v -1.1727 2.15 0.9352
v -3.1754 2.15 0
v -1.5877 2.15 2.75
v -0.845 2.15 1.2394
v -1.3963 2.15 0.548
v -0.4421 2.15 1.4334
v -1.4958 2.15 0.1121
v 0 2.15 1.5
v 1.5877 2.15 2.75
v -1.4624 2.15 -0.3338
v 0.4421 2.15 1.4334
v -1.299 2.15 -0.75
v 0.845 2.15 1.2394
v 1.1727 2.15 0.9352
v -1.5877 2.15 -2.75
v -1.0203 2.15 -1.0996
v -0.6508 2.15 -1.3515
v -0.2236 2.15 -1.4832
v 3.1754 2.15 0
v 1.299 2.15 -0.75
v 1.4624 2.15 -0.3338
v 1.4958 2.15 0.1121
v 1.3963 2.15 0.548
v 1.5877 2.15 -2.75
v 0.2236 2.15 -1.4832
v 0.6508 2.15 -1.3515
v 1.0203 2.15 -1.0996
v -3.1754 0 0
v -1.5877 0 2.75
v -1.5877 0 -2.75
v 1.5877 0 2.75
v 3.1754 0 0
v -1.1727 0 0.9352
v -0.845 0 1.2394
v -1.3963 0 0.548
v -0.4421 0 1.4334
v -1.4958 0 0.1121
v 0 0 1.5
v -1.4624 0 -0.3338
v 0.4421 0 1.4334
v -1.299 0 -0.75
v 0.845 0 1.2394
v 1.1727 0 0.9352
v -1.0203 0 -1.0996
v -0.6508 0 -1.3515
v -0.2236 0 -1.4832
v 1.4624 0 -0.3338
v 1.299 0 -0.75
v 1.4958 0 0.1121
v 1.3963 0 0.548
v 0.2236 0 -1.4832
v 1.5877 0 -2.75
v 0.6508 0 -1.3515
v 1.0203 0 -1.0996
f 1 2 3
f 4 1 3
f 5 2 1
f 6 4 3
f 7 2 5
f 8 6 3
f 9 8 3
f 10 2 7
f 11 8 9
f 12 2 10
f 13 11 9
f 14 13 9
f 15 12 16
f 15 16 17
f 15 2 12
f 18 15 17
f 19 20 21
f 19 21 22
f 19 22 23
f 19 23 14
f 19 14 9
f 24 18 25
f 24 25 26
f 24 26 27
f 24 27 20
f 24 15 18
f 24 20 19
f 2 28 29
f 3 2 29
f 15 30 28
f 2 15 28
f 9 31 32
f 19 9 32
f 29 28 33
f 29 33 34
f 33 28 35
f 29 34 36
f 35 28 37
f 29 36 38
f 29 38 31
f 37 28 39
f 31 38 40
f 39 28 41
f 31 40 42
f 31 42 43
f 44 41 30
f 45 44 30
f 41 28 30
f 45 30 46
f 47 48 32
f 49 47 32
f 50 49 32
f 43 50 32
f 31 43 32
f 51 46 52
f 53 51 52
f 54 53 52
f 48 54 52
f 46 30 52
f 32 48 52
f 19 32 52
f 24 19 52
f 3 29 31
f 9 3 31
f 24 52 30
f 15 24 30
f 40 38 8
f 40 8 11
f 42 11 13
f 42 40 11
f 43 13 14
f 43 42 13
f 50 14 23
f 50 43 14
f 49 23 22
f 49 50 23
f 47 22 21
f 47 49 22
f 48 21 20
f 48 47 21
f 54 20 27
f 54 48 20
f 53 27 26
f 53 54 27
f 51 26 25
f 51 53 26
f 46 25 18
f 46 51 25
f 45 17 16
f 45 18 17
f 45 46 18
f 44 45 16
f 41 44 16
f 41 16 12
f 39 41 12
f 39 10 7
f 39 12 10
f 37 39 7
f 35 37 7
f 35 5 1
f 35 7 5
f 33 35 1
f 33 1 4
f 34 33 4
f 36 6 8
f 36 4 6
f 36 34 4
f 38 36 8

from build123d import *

# Parameters (mm, degrees)
EXTRUDE_1_DEPTH          = 2.15
CUT_EXTRUDE_1_DEPTH      = 3
CUT_EXTRUDE_1_DEPTH_BACK = 0.8
SKETCH_3_R               = 1.5


with BuildPart() as part:
    # 草图1 → 凸台-拉伸1 (new body)
    with BuildSketch(Plane(origin=(0, 0, 0), x_dir=(1, 0, 0), z_dir=(0, 1, 0))):
        Polygon((3.175426481, 0), (1.58771324, 2.75), (-1.58771324, 2.75), (-3.175426481, 0), (-1.58771324, -2.75), (1.58771324, -2.75), align=None)
    extrude(amount=EXTRUDE_1_DEPTH)

    # 草图3 → 切除-拉伸1 (cut, two sides: drawn at the far end of the back side and taken through both)
    with BuildSketch(Plane(origin=(0, 0, 0), x_dir=(1, 0, 0), z_dir=(0, 1, 0)).offset(-CUT_EXTRUDE_1_DEPTH_BACK)):
        with Locations(Location((0, 0, 0), (0, 0, 270))):
            Circle(SKETCH_3_R)
    extrude(amount=CUT_EXTRUDE_1_DEPTH + CUT_EXTRUDE_1_DEPTH_BACK, mode=Mode.SUBTRACT)


solid = part.part
